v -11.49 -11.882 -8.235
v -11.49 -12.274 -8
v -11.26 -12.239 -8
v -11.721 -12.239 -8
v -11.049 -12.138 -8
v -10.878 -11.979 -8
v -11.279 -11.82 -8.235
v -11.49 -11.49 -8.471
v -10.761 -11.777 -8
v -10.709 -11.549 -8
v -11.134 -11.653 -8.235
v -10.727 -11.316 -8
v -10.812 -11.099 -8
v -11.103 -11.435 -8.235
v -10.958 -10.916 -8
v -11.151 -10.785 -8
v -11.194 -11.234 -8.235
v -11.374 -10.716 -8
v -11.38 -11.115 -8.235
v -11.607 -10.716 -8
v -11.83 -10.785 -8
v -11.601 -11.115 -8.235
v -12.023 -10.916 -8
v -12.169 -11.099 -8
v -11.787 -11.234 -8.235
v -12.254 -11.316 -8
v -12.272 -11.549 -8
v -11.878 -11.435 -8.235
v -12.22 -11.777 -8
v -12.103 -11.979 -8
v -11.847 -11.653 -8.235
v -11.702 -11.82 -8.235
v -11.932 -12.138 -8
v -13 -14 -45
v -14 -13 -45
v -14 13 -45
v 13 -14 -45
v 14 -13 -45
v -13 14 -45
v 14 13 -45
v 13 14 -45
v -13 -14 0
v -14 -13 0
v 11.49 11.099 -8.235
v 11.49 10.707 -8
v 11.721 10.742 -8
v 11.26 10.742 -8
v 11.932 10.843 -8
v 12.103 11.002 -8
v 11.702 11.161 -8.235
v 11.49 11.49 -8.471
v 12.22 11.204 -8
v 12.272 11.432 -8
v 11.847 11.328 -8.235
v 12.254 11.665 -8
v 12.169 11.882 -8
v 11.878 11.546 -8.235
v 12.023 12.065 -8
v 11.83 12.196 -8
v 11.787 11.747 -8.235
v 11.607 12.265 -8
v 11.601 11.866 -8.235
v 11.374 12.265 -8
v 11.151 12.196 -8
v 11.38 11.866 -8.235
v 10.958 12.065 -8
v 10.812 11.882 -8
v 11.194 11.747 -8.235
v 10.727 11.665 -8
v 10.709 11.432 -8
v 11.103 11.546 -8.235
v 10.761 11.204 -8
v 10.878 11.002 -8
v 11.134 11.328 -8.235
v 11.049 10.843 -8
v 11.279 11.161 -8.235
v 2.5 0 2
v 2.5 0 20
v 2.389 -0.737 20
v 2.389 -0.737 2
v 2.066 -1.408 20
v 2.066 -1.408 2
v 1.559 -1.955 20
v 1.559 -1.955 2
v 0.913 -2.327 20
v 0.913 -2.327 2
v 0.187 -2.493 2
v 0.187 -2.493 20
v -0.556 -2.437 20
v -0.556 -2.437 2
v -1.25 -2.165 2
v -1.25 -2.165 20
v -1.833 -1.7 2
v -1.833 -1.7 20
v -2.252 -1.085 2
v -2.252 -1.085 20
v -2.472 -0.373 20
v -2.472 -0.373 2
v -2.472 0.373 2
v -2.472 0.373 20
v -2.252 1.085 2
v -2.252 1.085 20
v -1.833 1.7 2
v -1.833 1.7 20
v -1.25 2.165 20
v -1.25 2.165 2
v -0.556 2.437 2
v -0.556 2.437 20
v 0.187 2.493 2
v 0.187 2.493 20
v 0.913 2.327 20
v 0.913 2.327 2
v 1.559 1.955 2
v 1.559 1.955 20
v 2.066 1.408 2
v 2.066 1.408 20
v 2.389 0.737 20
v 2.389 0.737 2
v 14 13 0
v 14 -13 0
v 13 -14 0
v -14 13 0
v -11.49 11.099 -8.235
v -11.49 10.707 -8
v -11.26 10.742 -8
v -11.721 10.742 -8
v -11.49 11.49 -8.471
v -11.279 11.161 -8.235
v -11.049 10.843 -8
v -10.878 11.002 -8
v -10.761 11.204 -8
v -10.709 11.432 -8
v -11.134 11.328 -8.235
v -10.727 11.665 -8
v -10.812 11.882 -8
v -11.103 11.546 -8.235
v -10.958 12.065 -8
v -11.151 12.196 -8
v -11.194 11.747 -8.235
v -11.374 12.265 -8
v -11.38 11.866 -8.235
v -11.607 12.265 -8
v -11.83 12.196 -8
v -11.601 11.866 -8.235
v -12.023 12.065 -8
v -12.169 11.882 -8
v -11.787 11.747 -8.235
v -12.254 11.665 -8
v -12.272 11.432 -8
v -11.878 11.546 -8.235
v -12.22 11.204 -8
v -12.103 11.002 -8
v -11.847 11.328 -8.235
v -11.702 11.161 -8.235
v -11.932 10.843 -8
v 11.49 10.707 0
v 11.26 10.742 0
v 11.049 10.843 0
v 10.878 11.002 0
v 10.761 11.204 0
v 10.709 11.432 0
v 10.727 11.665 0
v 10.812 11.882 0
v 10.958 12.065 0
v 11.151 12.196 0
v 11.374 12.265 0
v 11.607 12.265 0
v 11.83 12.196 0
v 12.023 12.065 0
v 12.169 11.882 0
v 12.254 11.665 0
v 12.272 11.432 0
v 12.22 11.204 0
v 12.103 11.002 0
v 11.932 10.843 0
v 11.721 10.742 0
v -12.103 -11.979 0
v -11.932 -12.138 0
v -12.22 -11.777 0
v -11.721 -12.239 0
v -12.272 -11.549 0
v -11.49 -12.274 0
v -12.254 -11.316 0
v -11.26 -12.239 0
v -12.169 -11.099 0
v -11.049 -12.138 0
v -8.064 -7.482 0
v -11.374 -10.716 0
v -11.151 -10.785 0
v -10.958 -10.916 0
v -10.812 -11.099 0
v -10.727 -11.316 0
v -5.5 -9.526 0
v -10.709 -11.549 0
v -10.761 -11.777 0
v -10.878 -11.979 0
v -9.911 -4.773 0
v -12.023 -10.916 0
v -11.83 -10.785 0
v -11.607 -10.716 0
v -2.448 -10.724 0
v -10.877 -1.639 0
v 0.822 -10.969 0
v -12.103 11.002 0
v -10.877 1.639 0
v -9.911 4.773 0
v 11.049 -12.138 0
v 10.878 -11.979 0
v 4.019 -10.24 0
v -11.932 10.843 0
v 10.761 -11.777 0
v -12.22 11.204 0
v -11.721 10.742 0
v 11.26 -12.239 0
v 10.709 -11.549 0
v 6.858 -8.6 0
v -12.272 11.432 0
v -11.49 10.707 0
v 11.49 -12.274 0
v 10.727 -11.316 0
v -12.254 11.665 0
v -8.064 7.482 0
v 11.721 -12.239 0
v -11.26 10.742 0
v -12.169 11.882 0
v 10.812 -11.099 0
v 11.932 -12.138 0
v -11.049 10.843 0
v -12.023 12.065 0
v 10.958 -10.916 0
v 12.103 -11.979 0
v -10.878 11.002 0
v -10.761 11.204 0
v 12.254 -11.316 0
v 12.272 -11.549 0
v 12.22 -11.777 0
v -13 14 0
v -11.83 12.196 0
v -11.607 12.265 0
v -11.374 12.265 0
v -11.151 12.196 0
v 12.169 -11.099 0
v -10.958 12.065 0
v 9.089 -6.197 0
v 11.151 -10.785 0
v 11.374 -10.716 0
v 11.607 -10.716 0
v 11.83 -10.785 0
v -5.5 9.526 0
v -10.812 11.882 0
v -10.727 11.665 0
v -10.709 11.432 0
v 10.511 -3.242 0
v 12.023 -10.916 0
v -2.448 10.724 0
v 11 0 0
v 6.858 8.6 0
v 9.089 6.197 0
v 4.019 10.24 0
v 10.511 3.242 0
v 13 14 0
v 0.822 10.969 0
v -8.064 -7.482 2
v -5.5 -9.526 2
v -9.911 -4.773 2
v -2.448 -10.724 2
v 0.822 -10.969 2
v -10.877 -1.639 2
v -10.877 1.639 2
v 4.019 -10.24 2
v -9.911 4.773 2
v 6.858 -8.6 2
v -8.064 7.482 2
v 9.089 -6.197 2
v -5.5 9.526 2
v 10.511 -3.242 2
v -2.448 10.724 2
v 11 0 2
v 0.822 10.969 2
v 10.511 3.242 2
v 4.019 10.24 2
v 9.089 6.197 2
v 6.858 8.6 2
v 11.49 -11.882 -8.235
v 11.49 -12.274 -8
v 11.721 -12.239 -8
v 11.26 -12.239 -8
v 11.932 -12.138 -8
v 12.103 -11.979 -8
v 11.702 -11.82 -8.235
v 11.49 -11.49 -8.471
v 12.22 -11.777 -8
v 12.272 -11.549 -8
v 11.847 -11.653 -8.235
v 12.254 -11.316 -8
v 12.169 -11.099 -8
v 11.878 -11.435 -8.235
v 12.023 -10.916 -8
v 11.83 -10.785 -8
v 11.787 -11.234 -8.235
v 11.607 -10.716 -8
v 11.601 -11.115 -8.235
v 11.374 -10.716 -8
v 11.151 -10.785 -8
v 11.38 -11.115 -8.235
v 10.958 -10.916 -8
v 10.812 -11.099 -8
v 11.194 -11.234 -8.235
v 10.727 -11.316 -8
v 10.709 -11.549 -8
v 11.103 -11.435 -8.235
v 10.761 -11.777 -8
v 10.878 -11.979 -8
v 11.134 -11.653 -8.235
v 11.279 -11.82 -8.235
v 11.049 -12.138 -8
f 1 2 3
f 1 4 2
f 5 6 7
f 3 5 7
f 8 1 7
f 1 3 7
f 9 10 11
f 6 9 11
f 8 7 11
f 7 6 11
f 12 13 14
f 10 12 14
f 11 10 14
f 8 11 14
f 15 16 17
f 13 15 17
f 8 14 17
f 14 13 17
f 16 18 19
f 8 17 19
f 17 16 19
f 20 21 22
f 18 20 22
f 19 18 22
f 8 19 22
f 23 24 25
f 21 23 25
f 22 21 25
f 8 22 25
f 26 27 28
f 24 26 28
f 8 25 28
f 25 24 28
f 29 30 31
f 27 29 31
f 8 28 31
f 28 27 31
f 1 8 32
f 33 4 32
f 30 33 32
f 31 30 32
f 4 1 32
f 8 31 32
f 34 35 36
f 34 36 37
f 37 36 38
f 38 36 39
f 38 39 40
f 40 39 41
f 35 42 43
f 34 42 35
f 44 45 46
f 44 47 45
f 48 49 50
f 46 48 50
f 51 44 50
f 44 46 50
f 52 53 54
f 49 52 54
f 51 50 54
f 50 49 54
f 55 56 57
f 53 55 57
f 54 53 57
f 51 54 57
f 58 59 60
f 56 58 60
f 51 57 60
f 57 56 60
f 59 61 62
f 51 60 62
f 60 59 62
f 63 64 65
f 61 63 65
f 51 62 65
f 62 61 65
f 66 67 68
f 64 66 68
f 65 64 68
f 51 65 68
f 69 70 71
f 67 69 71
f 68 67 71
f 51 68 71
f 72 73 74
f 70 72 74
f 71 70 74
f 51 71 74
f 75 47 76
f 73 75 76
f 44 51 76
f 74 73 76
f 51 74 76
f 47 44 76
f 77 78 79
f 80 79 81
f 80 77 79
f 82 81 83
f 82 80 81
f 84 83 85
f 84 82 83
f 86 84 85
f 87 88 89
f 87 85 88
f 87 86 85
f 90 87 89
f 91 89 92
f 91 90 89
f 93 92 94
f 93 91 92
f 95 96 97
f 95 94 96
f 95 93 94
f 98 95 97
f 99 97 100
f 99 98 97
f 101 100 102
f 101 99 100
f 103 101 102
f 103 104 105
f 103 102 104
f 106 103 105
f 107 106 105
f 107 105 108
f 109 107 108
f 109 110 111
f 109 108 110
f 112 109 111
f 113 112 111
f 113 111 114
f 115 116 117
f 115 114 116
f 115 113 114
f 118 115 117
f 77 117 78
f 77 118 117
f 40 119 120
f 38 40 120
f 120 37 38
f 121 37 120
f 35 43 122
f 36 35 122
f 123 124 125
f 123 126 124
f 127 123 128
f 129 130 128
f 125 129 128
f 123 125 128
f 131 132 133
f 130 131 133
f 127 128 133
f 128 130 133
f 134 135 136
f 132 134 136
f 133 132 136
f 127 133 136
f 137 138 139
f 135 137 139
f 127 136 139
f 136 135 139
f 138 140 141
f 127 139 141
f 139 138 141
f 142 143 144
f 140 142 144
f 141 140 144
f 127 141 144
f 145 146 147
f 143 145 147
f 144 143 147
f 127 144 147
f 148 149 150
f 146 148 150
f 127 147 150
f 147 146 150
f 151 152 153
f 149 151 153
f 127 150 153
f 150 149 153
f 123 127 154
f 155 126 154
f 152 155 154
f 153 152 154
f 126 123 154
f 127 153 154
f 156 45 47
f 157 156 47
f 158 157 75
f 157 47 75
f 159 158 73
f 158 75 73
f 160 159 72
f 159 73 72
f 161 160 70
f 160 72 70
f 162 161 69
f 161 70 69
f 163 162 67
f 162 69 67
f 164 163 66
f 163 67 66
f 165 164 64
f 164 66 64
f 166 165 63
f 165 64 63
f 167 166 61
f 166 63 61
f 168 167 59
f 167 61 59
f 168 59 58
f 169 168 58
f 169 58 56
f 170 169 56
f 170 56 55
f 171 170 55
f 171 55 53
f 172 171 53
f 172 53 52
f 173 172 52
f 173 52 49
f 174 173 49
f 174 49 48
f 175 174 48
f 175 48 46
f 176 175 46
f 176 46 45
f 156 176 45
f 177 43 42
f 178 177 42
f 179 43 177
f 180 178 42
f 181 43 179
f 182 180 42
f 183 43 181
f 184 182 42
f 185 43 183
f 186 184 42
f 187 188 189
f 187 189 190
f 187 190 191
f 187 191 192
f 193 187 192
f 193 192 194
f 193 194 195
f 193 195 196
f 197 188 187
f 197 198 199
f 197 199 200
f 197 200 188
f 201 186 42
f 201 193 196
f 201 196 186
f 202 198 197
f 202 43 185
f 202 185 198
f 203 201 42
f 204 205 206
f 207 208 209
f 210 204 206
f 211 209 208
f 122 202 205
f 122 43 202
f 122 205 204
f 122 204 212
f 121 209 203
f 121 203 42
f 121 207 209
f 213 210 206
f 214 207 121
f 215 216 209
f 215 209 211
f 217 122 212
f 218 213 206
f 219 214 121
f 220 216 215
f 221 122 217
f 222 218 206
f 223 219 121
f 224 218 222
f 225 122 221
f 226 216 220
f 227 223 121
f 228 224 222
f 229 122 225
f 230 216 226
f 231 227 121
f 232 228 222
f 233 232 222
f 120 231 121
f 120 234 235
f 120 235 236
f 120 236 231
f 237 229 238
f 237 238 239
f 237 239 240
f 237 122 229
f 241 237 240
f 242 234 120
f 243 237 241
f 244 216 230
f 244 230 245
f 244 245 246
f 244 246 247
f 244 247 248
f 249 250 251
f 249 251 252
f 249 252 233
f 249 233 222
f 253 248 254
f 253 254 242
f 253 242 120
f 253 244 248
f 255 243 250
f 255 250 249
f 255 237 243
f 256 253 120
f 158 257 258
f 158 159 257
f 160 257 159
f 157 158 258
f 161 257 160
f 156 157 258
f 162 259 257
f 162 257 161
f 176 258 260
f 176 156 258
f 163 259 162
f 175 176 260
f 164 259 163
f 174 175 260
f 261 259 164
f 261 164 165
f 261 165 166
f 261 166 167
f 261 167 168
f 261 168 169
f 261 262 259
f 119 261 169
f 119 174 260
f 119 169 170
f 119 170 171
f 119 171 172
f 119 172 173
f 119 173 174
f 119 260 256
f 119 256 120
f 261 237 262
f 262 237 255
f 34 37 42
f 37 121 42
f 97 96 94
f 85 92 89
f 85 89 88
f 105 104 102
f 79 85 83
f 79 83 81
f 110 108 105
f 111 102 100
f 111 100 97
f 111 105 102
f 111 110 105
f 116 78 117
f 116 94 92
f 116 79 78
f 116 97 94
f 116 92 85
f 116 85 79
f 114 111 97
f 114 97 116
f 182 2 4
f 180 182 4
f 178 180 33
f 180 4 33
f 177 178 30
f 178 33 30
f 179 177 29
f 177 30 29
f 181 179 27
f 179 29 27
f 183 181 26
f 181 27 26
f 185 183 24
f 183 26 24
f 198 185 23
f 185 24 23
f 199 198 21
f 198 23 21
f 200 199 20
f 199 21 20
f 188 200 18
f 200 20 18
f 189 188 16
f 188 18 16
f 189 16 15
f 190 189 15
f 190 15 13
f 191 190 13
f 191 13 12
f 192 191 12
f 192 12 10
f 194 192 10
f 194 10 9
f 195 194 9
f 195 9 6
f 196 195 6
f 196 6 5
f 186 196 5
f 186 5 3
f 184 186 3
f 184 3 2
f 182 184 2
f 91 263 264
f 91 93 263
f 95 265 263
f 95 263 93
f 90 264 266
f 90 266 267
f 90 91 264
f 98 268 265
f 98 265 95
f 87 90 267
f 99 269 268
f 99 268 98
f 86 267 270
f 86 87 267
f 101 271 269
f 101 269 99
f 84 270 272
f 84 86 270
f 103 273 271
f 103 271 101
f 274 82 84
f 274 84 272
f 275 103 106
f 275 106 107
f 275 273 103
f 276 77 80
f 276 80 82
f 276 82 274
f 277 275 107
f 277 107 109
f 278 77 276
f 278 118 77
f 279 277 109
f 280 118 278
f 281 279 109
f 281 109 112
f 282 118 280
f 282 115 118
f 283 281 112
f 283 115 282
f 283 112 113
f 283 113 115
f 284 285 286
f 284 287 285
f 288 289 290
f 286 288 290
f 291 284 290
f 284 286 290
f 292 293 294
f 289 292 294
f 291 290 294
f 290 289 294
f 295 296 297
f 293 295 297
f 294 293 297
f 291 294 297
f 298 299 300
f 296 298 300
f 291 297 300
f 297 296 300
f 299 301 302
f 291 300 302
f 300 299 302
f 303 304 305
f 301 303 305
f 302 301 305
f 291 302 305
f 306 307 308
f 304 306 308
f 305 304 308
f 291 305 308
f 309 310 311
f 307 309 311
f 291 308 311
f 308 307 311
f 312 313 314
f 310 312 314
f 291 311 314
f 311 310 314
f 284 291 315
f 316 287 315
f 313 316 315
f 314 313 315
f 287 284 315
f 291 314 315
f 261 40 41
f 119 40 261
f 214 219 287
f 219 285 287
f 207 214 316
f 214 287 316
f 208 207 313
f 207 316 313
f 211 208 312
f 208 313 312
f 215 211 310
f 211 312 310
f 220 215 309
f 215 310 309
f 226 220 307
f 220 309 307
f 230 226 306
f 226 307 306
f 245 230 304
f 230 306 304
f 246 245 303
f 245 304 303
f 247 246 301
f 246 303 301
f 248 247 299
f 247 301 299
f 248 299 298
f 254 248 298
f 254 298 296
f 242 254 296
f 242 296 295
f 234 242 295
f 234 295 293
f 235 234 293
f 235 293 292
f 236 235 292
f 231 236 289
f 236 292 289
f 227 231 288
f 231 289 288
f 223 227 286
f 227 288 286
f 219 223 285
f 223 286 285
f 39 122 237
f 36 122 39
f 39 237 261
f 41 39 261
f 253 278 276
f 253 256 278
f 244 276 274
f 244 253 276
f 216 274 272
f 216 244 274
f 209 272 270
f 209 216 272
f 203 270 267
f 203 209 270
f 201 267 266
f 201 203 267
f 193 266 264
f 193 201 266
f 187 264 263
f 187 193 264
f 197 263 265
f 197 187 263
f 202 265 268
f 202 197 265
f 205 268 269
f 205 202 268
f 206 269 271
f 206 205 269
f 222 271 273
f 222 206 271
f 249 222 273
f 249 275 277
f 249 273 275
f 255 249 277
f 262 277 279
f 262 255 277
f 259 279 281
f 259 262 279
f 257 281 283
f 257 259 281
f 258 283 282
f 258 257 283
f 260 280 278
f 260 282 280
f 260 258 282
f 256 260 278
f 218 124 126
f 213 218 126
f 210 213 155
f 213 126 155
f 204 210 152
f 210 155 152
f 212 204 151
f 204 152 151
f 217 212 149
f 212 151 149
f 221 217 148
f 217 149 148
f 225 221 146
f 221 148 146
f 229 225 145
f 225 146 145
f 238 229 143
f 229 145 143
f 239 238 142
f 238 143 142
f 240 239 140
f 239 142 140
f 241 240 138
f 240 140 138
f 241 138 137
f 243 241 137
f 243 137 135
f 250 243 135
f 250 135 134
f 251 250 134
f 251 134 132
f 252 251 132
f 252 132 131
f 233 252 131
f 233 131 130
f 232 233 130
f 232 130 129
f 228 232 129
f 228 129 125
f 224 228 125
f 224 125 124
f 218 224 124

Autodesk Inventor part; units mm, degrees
ref_plane "YZ Plane" through (0, 0, 0) normal (1, 0, 0) x (0, 1, 0)
ref_plane "XZ Plane" through (0, 0, 0) normal (0, 1, 0) x (-1, 0, 0)
ref_plane "XY Plane" through (0, 0, 0) normal (0, 0, 1) x (1, 0, 0)
sketch "Skizze1" plane through (0, 0, 0) normal (0, 0, 1) x (1, 0, 0)
  line L0 (-14, 14) -> (14, 14)
  line L1 (14, 14) -> (14, -14)
  line L2 (14, -14) -> (-14, -14)
  line L3 (-14, -14) -> (-14, 14)
  circle A0 centre (0, 0) radius 11
  circle A1 centre (0, 0) radius 2.5
  line L4 (-14, 0) -> (14, 0) construction
  line L5 (0, 14) -> (0, -14) construction
  line L6 (-11.4905, 11.4905) -> (11.4905, 11.4905) construction
  line L7 (11.4905, 11.4905) -> (11.4905, -11.4905) construction
  line L8 (11.4905, -11.4905) -> (-11.4905, -11.4905) construction
  line L9 (-11.4905, -11.4905) -> (-11.4905, 11.4905) construction
  circle A2 centre (0, 0) radius 16.25 construction
  point P0 (0, -11.4905)
  point P1 (11.4905, 0)
  dimension "d4" = 32.5
  dimension "d0" = 5
  dimension "d1" = 22
  dimension "d2" = 28
extrude "Extrusion1" add sketch "Skizze1" along normal blind 2 contours A0 | A1
extrude "Extrusion2" add sketch "Skizze1" along normal blind 20 contours A1
extrude "Extrusion3" add sketch "Skizze1" against normal blind 45 contours L0 L1 L2 L3 | A0 | A1
hole "Bohrung1" at (-11.4905, 11.4905, 0) at (11.4905, 11.4905, 0) at (11.4905, -11.4905, 0) at (-11.4905, -11.4905, 0) direction (0, 0, -1) diameter 1.567 depth 8 tip angle 118 thread size "M2x0.4" class "6H" standard "ANSI Metric M Profile"
chamfer "Fase1" distance 1 angle 45 4 edges at (14, -14, -22.5) (-14, -14, -22.5) (14, 14, -22.5) (-14, 14, -22.5)
properties part number "Nema11" material "Stahl"
